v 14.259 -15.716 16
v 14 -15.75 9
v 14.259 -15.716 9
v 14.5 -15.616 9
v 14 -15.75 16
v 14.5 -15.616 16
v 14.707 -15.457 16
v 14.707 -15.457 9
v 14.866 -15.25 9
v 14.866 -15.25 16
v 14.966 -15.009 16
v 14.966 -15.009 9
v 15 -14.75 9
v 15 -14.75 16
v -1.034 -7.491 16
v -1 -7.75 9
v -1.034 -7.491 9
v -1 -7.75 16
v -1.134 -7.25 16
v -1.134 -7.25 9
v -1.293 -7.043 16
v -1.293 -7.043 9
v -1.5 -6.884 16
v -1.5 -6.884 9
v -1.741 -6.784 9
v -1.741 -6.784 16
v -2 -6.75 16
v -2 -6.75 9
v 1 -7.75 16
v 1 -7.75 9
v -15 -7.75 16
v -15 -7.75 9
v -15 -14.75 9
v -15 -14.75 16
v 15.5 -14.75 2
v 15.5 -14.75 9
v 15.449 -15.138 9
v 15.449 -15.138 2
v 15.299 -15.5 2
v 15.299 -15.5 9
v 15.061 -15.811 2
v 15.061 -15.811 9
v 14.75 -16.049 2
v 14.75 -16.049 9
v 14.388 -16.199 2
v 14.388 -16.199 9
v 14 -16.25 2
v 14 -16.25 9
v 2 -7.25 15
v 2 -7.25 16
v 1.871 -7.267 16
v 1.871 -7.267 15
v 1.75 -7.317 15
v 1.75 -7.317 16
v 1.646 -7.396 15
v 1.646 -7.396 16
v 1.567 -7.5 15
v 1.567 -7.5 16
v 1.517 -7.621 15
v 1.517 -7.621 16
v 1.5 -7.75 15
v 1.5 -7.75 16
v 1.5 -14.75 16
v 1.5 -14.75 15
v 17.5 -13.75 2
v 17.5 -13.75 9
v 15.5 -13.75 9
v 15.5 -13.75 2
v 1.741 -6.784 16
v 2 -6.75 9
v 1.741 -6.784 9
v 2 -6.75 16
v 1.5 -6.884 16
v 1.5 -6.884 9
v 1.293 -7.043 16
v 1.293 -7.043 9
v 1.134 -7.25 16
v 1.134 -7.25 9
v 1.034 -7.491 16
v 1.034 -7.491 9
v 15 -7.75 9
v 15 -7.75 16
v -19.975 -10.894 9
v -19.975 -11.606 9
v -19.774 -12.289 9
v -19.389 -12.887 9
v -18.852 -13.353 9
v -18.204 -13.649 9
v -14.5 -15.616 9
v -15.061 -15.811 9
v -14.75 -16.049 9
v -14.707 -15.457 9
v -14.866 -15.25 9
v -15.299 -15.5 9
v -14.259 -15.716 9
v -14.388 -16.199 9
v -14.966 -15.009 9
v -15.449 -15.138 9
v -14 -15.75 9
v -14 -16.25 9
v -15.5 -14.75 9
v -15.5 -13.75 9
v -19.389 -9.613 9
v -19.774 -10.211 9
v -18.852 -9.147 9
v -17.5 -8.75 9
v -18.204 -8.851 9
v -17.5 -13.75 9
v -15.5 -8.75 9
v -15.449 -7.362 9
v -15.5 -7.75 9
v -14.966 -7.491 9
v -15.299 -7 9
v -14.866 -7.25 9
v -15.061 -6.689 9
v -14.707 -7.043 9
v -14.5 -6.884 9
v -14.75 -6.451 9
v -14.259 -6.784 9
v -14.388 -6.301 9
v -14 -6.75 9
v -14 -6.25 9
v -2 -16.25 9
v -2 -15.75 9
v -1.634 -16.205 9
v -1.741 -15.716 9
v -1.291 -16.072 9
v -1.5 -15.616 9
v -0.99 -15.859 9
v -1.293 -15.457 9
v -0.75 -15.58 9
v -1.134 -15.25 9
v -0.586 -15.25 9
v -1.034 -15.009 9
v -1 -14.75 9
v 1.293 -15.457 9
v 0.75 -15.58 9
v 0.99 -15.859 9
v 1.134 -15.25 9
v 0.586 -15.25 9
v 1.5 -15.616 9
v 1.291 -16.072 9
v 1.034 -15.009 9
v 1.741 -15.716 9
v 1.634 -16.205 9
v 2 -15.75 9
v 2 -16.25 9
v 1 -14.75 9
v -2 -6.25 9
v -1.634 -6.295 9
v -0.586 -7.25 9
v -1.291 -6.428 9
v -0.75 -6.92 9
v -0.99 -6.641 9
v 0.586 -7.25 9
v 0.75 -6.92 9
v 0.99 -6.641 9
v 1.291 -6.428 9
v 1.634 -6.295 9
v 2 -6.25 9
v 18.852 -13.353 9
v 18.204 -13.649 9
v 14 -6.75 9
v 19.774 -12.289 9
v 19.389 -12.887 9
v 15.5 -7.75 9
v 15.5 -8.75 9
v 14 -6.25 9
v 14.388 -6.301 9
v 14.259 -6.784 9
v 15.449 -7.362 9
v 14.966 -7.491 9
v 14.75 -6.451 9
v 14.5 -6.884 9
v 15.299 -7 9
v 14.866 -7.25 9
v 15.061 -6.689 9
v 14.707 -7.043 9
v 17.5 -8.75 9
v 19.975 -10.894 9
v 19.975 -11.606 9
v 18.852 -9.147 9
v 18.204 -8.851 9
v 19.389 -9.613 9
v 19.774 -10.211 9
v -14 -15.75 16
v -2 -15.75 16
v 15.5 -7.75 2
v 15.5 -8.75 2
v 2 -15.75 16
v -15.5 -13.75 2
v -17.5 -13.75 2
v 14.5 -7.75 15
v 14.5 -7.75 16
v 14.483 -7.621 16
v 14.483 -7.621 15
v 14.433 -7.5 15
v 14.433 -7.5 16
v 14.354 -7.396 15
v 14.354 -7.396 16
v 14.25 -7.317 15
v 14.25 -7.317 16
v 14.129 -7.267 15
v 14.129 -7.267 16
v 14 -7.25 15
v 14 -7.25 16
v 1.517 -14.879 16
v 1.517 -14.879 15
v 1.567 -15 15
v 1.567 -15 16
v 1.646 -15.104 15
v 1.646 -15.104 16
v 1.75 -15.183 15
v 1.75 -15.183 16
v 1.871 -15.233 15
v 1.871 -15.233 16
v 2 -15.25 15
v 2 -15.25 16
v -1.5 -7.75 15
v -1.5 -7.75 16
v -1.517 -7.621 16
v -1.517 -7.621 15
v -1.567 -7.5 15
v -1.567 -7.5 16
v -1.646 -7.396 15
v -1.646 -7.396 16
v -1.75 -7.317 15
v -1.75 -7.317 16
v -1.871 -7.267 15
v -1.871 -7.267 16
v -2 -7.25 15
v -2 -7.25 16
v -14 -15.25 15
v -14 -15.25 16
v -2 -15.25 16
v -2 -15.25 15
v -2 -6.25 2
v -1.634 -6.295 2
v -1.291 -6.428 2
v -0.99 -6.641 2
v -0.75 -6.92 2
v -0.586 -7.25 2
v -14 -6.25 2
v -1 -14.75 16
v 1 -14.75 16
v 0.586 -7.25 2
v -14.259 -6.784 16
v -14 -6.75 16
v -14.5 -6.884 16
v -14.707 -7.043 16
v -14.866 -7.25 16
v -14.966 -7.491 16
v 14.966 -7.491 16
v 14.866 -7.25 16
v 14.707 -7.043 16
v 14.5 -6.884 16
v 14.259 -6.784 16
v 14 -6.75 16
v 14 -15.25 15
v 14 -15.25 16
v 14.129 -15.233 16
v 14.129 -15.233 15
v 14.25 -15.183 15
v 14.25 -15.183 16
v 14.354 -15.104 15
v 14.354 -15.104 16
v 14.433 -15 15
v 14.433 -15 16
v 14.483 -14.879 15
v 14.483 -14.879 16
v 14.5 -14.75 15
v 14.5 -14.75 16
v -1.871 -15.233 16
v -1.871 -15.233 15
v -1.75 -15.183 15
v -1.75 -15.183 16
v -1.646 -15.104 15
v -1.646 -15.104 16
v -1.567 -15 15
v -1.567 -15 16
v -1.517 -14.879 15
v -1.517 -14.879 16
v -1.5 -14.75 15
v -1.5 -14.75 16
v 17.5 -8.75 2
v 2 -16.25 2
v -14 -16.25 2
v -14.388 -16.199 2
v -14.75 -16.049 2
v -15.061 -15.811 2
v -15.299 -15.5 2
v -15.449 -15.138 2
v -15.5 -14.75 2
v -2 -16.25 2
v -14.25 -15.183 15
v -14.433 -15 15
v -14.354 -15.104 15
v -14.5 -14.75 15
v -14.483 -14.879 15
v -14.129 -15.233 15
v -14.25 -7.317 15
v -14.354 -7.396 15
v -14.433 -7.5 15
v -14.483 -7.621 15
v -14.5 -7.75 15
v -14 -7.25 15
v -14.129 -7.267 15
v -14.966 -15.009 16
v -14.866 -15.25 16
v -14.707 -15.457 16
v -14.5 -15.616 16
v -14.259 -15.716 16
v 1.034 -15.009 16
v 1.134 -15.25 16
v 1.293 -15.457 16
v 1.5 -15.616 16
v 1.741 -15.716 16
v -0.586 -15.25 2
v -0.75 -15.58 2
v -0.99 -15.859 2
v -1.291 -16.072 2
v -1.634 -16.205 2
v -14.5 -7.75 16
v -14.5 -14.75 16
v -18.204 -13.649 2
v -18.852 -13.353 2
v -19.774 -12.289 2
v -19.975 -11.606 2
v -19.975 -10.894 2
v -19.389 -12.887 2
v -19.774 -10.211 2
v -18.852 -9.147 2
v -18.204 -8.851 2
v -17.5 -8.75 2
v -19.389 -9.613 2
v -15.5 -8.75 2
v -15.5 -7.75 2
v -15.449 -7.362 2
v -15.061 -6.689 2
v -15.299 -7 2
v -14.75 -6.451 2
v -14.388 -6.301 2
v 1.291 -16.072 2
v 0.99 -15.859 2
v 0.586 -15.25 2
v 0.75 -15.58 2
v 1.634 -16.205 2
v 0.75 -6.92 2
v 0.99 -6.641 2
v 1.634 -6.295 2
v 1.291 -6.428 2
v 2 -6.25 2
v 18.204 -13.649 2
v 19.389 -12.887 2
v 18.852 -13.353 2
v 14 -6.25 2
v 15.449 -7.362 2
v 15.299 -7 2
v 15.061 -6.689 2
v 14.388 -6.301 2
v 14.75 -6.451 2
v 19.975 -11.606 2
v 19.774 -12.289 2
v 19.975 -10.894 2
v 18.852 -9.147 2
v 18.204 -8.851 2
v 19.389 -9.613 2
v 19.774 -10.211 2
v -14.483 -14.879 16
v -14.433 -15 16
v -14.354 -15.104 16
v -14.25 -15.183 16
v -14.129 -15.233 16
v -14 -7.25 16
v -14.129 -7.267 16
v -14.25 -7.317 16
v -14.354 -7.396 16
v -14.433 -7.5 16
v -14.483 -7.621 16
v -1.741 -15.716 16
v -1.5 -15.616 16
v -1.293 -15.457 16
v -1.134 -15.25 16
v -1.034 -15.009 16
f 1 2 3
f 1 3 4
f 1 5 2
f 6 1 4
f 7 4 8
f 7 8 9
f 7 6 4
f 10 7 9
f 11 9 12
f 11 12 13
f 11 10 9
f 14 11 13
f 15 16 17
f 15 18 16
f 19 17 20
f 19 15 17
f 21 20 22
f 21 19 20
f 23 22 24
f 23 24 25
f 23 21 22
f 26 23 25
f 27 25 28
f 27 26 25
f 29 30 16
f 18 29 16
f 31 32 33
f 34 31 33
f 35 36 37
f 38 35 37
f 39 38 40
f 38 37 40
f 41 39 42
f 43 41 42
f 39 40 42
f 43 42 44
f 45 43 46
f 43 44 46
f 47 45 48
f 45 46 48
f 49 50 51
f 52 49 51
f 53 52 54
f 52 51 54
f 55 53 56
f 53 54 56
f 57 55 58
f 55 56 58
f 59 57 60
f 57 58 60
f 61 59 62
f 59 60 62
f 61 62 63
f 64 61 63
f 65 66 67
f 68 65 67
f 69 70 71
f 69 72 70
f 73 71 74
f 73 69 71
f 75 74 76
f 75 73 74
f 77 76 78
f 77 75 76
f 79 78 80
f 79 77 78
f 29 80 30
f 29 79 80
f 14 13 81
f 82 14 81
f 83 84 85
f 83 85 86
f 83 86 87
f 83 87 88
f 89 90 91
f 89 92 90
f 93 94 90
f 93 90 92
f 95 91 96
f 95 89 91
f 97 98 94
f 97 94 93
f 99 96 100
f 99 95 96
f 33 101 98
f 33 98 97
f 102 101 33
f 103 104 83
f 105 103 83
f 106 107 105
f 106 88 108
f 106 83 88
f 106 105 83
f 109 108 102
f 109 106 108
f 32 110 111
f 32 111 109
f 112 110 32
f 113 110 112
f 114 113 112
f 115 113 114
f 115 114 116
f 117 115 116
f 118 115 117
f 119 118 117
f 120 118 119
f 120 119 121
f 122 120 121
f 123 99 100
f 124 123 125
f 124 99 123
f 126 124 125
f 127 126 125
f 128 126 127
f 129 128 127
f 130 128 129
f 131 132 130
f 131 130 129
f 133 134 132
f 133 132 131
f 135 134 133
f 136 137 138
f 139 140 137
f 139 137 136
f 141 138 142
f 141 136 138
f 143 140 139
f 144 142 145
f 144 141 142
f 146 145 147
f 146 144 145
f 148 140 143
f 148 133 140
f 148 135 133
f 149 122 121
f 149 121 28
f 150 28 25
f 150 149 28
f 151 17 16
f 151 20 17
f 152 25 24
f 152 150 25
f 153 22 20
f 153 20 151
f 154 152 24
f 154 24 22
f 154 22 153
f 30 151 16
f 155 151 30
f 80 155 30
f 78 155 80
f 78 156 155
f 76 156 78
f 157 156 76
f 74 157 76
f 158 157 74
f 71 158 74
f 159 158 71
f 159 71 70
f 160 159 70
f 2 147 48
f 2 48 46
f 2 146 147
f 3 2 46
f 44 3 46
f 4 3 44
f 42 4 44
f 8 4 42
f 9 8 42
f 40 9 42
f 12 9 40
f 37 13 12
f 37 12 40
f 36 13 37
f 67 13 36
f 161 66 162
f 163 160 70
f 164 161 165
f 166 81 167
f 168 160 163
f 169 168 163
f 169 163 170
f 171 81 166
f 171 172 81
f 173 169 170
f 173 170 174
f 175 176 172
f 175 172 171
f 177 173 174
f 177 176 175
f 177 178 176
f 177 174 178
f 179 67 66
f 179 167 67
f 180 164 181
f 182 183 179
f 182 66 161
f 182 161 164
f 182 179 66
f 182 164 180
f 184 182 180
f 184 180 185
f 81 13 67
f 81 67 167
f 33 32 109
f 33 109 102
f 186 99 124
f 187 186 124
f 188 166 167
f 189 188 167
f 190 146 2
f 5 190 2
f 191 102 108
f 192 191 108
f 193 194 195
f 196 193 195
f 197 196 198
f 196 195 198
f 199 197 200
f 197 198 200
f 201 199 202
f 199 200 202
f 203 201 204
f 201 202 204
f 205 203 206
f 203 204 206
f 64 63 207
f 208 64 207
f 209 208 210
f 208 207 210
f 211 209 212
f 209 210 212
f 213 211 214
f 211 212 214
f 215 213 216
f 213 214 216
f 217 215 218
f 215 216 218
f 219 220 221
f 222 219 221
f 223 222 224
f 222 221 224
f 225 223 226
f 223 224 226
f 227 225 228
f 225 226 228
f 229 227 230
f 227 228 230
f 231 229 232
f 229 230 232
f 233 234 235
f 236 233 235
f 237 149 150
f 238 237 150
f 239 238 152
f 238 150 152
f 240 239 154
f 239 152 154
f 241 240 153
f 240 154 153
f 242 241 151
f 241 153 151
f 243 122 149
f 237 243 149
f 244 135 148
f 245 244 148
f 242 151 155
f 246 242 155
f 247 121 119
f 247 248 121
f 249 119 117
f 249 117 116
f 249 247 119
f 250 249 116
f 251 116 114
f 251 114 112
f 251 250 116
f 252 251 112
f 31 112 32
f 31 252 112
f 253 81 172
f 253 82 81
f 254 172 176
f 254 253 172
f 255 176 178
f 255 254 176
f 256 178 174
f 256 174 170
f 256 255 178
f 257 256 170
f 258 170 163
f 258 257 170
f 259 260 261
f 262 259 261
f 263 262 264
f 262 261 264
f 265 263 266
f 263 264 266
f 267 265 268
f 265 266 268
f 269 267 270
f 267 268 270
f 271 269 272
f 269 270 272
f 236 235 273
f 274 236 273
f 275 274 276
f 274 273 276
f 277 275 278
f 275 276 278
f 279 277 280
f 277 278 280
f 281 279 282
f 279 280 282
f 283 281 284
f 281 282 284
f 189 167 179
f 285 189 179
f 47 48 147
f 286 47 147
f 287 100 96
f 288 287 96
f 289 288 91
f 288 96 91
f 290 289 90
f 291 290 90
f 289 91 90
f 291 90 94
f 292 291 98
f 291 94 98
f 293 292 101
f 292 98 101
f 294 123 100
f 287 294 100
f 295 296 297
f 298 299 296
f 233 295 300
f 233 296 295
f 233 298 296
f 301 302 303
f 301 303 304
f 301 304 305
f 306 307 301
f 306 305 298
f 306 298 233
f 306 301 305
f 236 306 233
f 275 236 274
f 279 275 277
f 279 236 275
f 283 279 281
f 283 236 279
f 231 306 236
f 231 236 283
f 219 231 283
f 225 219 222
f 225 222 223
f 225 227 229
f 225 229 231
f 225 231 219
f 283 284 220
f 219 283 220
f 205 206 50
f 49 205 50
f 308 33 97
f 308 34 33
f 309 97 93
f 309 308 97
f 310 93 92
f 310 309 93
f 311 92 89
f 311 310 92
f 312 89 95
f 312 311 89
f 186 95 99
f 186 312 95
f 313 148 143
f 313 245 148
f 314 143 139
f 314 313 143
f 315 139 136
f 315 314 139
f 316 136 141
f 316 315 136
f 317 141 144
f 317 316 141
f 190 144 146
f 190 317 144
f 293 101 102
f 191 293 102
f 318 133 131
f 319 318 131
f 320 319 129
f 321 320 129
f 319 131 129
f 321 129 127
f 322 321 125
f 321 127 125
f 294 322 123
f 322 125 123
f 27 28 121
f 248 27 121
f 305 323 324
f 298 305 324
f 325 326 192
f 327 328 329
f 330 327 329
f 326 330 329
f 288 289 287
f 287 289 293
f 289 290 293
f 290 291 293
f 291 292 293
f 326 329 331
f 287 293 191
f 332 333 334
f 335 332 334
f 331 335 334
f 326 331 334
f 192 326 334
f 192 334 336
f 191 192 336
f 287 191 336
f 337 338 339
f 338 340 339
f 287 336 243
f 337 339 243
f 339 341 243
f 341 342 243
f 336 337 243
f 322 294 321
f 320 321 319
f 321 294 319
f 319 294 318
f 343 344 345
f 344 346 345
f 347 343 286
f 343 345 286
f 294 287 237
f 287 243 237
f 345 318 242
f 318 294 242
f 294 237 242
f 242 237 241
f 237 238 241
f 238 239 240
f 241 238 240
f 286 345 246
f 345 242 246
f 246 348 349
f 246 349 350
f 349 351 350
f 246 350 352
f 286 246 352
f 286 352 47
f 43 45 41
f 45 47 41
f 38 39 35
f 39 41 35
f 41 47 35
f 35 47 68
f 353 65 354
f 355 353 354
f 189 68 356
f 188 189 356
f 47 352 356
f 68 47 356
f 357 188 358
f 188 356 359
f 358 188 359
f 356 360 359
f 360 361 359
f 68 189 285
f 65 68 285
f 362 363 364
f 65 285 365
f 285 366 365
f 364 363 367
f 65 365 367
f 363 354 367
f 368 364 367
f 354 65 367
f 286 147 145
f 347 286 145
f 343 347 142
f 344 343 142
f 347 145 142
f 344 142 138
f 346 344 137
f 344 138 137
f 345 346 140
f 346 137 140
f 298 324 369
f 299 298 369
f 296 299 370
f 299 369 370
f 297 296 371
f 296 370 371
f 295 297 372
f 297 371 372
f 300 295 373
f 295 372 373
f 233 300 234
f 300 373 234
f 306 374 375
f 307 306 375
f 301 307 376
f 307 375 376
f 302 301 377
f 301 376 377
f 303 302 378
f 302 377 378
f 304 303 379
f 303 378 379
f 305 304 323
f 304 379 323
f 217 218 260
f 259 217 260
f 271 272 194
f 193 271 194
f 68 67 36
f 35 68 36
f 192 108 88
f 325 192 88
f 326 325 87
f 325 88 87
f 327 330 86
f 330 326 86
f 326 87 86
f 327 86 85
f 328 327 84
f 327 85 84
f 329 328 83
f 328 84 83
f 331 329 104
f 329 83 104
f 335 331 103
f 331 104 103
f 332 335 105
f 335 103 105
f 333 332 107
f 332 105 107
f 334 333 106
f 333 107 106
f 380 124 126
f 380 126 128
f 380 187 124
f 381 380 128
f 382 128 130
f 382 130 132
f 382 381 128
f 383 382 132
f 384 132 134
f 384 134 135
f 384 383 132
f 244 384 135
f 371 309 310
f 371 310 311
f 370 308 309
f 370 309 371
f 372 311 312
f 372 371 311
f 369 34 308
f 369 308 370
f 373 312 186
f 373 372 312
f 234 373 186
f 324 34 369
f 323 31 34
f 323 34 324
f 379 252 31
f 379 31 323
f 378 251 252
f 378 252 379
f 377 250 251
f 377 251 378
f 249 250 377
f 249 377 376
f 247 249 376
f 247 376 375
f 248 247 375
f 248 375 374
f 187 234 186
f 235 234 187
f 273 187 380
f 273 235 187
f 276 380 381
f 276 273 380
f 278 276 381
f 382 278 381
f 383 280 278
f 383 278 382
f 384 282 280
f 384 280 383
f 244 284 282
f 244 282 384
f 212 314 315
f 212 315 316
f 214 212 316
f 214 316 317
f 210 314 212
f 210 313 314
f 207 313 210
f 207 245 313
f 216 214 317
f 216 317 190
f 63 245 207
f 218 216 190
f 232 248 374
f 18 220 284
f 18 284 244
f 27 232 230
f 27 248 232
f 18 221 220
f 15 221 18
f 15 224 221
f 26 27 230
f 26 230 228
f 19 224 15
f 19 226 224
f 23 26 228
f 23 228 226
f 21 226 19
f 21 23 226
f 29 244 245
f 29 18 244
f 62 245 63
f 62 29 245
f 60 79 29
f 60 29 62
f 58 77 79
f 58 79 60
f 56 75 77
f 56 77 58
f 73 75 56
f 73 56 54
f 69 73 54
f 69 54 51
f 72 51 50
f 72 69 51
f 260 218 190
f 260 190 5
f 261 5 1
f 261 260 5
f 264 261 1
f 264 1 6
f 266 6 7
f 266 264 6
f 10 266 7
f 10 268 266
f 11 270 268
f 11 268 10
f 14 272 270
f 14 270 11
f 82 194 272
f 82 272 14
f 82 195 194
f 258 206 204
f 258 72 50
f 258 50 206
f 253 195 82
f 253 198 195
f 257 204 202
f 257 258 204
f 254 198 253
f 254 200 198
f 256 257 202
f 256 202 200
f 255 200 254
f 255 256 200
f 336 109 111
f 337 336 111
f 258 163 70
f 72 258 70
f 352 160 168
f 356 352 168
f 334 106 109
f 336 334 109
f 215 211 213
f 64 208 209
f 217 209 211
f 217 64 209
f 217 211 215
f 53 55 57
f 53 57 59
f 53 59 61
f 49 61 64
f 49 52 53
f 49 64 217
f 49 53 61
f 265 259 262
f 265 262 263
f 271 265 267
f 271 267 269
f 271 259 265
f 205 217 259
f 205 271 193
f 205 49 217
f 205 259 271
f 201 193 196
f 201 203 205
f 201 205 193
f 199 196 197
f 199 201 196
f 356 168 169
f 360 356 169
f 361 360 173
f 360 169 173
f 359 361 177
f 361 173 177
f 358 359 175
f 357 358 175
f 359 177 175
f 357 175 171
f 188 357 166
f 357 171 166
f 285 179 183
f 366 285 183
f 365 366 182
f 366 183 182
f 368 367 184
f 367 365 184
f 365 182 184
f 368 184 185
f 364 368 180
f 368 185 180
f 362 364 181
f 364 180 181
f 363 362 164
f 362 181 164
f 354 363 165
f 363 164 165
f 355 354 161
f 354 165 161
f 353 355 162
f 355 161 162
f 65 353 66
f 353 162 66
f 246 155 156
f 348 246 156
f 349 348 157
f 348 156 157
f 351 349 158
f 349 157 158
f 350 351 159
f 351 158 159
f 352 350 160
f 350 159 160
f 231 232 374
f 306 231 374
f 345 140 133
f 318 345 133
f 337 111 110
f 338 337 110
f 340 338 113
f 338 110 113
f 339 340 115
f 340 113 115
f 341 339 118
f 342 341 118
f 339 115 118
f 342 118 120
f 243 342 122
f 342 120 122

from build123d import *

# Parameters (mm, degrees)
SKETCH1_W           = 45
SKETCH1_H           = 37.5
BOSS_EXTRUDE1_DEPTH = 2
SKETCH2_W           = 40
SKETCH2_H           = 13
BOSS_EXTRUDE2_DEPTH = 7
BOSS_EXTRUDE3_DEPTH = 7
FILLET1_R           = 1
CUT_EXTRUDE1_DEPTH  = 1
SKETCH5_W           = 41
SKETCH5_H           = 14
CUT_EXTRUDE2_DEPTH  = 7
SKETCH6_W           = 11
SKETCH6_H           = 20
BOSS_EXTRUDE5_DEPTH = 12
SKETCH7_W           = 9
SKETCH7_H           = 9
CUT_EXTRUDE3_DEPTH  = 12
SKETCH8_W           = 132.830335996
SKETCH8_H           = 96.675499104
CUT_EXTRUDE4_DEPTH  = 20


with BuildPart() as part:
    # Sketch1 → Boss-Extrude1 (new body)
    with BuildSketch(Plane.XY):
        Rectangle(SKETCH1_W, SKETCH1_H)
    extrude(amount=BOSS_EXTRUDE1_DEPTH)

    # Sketch2 → Boss-Extrude2 (add)
    with BuildSketch(Plane.XY.offset(2)):
        with Locations((0, -11.25)):
            Rectangle(SKETCH2_W, SKETCH2_H)
    extrude(amount=BOSS_EXTRUDE2_DEPTH)

    # Sketch3 → Boss-Extrude3 (add)
    with BuildSketch(Plane.XY.offset(9)):
        Polygon((-1, -7.75), (-1, -6.75), (-15, -6.75), (-15, -15.75), (-1, -15.75), (-1, -14.75), (1, -14.75), (1, -15.75), (15, -15.75), (15, -6.75), (1, -6.75), (1, -7.75), align=None)
    extrude(amount=BOSS_EXTRUDE3_DEPTH)

    # Fillet1
    fillet1_edges = [part.edges().sort_by_distance(p)[0] for p in [
        (-15, -15.75, 12.5),
        (-1, -15.75, 12.5),
        (1, -15.75, 12.5),
        (-15, -6.75, 12.5),
        (15, -15.75, 12.5),
        (15, -6.75, 12.5),
        (1, -6.75, 12.5),
        (-1, -6.75, 12.5),
    ]]
    fillet(fillet1_edges, radius=FILLET1_R - 0.0001)  # a hair under: the kernel refuses the full size

    # Sketch4 → Cut-Extrude1 (cut)
    with BuildSketch(Plane.XY.offset(16)):
        with BuildLine():
            Line((-1.5, -14.75), (-1.5, -7.75))
            ThreePointArc((-1.5, -7.75), (-1.646446609, -7.396446609), (-2, -7.25))
            Line((-2, -7.25), (-14, -7.25))
            ThreePointArc((-14, -7.25), (-14.353553391, -7.396446609), (-14.5, -7.75))
            Line((-14.5, -7.75), (-14.5, -14.75))
            ThreePointArc((-14.5, -14.75), (-14.353553391, -15.103553391), (-14, -15.25))
            Line((-14, -15.25), (-2, -15.25))
            ThreePointArc((-2, -15.25), (-1.646446609, -15.103553391), (-1.5, -14.75))
        make_face()
        with BuildLine():
            Line((1.5, -7.75), (1.5, -14.75))
            ThreePointArc((1.5, -14.75), (1.646446609, -15.103553391), (2, -15.25))
            Line((2, -15.25), (14, -15.25))
            ThreePointArc((14, -15.25), (14.353553391, -15.103553391), (14.5, -14.75))
            Line((14.5, -14.75), (14.5, -7.75))
            ThreePointArc((14.5, -7.75), (14.353553391, -7.396446609), (14, -7.25))
            Line((14, -7.25), (2, -7.25))
            ThreePointArc((2, -7.25), (1.646446609, -7.396446609), (1.5, -7.75))
        make_face()
    extrude(amount=-CUT_EXTRUDE1_DEPTH, mode=Mode.SUBTRACT)

    # Sketch5 → Cut-Extrude2 (cut)
    with BuildSketch(Plane.XY.offset(9)):
        with Locations((0, -11.25)):
            Rectangle(SKETCH5_W, SKETCH5_H)
        with BuildLine():
            Line((-17.5, -8.75), (-15.5, -8.75))
            Line((-15.5, -8.75), (-15.5, -7.75))
            ThreePointArc((-15.5, -7.75), (-15.060660172, -6.689339828), (-14, -6.25))
            Line((-14, -6.25), (-2, -6.25))
            ThreePointArc((-2, -6.25), (-1.133974596, -6.525255129), (-0.585786438, -7.25))
            Line((-0.585786438, -7.25), (0.585786438, -7.25))
            ThreePointArc((0.585786438, -7.25), (1.133974596, -6.525255129), (2, -6.25))
            Line((2, -6.25), (14, -6.25))
            ThreePointArc((14, -6.25), (15.060660172, -6.689339828), (15.5, -7.75))
            Line((15.5, -7.75), (15.5, -8.75))
            Line((15.5, -8.75), (17.5, -8.75))
            ThreePointArc((17.5, -8.75), (20, -11.25), (17.5, -13.75))
            Line((17.5, -13.75), (15.5, -13.75))
            Line((15.5, -13.75), (15.5, -14.75))
            ThreePointArc((15.5, -14.75), (15.060660172, -15.810660172), (14, -16.25))
            Line((14, -16.25), (2, -16.25))
            ThreePointArc((2, -16.25), (1.133974596, -15.974744871), (0.585786438, -15.25))
            Line((0.585786438, -15.25), (-0.585786438, -15.25))
            ThreePointArc((-0.585786438, -15.25), (-1.133974596, -15.974744871), (-2, -16.25))
            Line((-2, -16.25), (-14, -16.25))
            ThreePointArc((-14, -16.25), (-15.060660172, -15.810660172), (-15.5, -14.75))
            Line((-15.5, -14.75), (-15.5, -13.75))
            Line((-15.5, -13.75), (-17.5, -13.75))
            ThreePointArc((-17.5, -13.75), (-20, -11.25), (-17.5, -8.75))
        make_face(mode=Mode.SUBTRACT)
    extrude(amount=-CUT_EXTRUDE2_DEPTH, mode=Mode.SUBTRACT)

    # Sketch6 → Boss-Extrude5 (add)
    with BuildSketch(Plane(origin=(0, 0, 0), x_dir=(-1, 0, 0), z_dir=(0, 0, -1))):
        with Locations((-6, 8.25)):
            Rectangle(SKETCH6_W, SKETCH6_H)
        with Locations((6, 8.25)):
            Rectangle(SKETCH6_W, SKETCH6_H)
    extrude(amount=BOSS_EXTRUDE5_DEPTH)

    # Sketch7 → Cut-Extrude3 (cut)
    with BuildSketch(Plane(origin=(0, 18.25, 0), x_dir=(1, 0, 0), z_dir=(0, 1, 0))):
        with Locations((-6, 5.5)):
            Rectangle(SKETCH7_W, SKETCH7_H)
        with Locations((6, 5.5)):
            Rectangle(SKETCH7_W, SKETCH7_H)
    extrude(amount=-CUT_EXTRUDE3_DEPTH, mode=Mode.SUBTRACT)

    # Sketch8 → Cut-Extrude4 (cut)
    with BuildSketch(Plane.XY.offset(2)):
        Rectangle(SKETCH8_W, SKETCH8_H)
    extrude(amount=-CUT_EXTRUDE4_DEPTH, mode=Mode.SUBTRACT)


solid = part.part
